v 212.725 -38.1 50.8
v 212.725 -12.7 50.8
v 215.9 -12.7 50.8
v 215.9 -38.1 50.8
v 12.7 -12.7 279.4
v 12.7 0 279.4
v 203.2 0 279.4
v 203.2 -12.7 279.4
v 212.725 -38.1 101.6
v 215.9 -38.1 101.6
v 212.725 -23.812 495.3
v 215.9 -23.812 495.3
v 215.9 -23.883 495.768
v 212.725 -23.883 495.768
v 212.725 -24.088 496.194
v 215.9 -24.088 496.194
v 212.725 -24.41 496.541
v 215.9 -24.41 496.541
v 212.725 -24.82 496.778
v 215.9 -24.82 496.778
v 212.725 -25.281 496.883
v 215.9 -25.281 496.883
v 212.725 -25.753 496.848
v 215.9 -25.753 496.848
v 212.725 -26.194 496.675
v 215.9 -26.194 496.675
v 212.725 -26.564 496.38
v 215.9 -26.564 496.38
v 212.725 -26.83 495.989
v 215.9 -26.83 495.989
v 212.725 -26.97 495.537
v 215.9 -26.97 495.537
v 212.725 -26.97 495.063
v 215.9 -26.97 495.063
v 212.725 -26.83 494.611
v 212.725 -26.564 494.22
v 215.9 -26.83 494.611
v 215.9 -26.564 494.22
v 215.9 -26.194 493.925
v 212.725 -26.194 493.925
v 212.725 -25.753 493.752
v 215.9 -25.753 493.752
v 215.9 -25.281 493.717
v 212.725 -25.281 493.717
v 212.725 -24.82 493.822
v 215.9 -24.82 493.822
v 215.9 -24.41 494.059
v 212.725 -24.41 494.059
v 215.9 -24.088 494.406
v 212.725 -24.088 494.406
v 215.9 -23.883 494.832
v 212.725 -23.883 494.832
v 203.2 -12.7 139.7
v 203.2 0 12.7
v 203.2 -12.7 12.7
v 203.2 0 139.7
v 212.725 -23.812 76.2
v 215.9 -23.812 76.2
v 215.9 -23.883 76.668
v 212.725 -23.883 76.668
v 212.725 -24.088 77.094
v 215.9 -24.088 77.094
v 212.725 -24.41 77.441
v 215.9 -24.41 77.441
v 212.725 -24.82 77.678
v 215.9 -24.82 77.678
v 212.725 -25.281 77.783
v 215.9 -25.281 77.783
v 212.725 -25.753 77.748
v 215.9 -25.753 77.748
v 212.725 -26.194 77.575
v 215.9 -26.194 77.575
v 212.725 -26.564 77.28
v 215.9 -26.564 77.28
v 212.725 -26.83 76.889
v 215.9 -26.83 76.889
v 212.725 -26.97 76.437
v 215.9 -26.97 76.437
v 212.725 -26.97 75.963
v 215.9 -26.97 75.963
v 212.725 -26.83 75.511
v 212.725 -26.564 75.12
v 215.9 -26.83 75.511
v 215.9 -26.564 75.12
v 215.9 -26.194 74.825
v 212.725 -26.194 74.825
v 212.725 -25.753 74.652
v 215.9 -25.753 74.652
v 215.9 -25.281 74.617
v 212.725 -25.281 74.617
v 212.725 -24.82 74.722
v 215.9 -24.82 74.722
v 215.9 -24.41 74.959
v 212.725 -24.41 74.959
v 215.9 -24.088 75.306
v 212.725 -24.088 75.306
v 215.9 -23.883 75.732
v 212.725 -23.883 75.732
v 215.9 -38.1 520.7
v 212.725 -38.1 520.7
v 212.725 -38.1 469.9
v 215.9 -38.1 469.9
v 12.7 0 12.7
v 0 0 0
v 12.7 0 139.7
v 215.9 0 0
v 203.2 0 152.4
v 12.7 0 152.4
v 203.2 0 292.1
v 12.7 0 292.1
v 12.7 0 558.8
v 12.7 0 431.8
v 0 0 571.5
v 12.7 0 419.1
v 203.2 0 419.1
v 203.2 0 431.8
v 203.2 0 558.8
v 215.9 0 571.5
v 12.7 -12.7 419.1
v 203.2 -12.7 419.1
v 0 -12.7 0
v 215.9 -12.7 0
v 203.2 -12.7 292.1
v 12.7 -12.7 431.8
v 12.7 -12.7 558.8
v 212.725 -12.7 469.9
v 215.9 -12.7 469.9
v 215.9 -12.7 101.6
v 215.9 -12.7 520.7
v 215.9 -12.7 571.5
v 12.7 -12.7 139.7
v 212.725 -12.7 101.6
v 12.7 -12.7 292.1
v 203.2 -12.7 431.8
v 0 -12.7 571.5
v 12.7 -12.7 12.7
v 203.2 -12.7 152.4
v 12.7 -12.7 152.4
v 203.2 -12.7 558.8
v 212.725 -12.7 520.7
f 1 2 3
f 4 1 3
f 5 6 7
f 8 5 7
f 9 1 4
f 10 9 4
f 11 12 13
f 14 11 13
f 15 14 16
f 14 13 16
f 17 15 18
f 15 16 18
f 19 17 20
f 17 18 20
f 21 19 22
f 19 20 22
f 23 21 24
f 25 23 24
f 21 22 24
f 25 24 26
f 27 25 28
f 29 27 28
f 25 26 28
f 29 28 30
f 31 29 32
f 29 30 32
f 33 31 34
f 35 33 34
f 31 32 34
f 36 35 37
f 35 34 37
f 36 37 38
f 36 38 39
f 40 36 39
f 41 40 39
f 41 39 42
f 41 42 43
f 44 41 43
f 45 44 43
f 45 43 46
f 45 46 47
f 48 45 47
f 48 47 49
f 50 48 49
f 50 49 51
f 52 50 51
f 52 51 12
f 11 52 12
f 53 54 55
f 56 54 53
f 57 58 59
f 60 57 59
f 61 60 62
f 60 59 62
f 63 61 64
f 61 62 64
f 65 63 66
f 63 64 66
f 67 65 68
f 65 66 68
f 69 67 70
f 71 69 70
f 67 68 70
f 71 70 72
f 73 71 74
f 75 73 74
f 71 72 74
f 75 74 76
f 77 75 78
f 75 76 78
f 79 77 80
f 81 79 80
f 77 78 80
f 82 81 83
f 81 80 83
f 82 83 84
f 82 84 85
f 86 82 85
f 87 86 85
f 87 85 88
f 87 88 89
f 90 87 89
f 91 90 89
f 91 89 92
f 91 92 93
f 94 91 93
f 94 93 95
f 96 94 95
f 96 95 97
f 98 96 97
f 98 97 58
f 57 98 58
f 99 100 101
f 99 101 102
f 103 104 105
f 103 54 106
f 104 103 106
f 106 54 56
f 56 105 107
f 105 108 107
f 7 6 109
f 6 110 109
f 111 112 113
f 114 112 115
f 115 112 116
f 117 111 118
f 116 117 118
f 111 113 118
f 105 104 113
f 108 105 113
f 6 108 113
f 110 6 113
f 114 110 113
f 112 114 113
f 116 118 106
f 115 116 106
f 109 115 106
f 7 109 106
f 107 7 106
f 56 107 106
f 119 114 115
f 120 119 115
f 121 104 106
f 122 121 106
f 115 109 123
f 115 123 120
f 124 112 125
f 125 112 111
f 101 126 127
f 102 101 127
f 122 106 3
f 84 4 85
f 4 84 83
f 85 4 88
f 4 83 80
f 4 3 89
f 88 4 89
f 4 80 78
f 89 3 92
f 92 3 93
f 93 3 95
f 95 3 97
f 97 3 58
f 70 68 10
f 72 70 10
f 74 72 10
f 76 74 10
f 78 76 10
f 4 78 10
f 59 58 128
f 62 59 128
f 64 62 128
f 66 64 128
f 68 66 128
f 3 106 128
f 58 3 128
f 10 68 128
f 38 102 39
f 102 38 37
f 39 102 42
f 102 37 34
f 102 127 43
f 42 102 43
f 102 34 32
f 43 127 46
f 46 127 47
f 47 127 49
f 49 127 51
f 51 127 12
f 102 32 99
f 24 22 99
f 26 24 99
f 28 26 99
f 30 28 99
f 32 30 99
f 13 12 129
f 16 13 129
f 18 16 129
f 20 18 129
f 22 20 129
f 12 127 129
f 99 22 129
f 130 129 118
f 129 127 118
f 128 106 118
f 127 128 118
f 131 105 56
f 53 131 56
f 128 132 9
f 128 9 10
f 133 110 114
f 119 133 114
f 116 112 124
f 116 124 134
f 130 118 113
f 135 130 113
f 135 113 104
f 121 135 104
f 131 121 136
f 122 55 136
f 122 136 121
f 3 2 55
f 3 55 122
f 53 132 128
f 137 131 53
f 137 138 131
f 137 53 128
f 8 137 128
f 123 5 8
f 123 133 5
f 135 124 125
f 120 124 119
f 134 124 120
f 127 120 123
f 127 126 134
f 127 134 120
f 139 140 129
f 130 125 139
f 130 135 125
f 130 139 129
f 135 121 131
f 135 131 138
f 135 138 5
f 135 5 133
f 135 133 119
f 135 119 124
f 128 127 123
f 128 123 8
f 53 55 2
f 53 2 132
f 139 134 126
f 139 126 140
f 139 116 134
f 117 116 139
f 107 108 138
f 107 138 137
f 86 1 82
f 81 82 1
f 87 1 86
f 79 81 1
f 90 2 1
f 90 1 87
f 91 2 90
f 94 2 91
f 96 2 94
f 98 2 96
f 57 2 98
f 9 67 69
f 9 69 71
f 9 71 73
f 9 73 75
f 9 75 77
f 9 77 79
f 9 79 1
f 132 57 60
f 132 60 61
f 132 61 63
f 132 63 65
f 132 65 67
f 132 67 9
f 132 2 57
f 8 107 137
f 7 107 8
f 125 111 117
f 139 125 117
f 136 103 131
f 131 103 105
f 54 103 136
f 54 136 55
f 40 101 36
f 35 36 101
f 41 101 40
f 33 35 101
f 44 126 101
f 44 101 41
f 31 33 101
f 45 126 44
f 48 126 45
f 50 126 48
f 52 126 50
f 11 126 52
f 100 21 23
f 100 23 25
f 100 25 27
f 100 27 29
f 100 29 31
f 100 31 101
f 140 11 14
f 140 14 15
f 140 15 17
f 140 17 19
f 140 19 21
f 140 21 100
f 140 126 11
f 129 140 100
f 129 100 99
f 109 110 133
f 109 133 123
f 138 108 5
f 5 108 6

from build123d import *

# Parameters (mm, degrees)
F0_W     = 190.5
F0_H     = 127
F1_DEPTH = 12.7
F2_W     = 3.175
F2_H     = 50.8
F3_DEPTH = 25.4
F4_W     = 3.175
F4_H     = 50.8
F5_DEPTH = 25.4
F7_D     = 3.175


with BuildPart() as f1:
    # F0 (on Front) → F1 (new body)
    with BuildSketch(Plane.XZ):
        Polygon((0, 571.5), (0, 0), (215.9, 0), (215.9, 571.5), (203.2, 571.5), (12.7, 571.5), align=None)
        with Locations((107.95, 76.2)):
            Rectangle(F0_W, F0_H, mode=Mode.SUBTRACT)
        with Locations((107.95, 215.9)):
            Rectangle(F0_W, F0_H, mode=Mode.SUBTRACT)
        with Locations((107.95, 355.6)):
            Rectangle(F0_W, F0_H, mode=Mode.SUBTRACT)
        with Locations((107.95, 495.3)):
            Rectangle(F0_W, F0_H, mode=Mode.SUBTRACT)
    extrude(amount=F1_DEPTH)

    # F2 (on face) → F3 (join)
    with BuildSketch(Plane.XZ.offset(12.7)):
        with Locations((214.3125, 495.3)):
            Rectangle(F2_W, F2_H)
    extrude(amount=F3_DEPTH)

    # F4 (on face) → F5 (join)
    with BuildSketch(Plane.XZ.offset(12.7)):
        with Locations((214.3125, 76.2)):
            Rectangle(F4_W, F4_H)
    extrude(amount=F5_DEPTH)

    # F7 (through all)
    with Locations(Plane(origin=(212.725, 0, 0), x_dir=(0, -1, 0), z_dir=(-1, 0, 0))):
        with Locations((25.4, 495.3), (25.4, 76.2)):
            Hole(F7_D / 2)


solid = f1.part
